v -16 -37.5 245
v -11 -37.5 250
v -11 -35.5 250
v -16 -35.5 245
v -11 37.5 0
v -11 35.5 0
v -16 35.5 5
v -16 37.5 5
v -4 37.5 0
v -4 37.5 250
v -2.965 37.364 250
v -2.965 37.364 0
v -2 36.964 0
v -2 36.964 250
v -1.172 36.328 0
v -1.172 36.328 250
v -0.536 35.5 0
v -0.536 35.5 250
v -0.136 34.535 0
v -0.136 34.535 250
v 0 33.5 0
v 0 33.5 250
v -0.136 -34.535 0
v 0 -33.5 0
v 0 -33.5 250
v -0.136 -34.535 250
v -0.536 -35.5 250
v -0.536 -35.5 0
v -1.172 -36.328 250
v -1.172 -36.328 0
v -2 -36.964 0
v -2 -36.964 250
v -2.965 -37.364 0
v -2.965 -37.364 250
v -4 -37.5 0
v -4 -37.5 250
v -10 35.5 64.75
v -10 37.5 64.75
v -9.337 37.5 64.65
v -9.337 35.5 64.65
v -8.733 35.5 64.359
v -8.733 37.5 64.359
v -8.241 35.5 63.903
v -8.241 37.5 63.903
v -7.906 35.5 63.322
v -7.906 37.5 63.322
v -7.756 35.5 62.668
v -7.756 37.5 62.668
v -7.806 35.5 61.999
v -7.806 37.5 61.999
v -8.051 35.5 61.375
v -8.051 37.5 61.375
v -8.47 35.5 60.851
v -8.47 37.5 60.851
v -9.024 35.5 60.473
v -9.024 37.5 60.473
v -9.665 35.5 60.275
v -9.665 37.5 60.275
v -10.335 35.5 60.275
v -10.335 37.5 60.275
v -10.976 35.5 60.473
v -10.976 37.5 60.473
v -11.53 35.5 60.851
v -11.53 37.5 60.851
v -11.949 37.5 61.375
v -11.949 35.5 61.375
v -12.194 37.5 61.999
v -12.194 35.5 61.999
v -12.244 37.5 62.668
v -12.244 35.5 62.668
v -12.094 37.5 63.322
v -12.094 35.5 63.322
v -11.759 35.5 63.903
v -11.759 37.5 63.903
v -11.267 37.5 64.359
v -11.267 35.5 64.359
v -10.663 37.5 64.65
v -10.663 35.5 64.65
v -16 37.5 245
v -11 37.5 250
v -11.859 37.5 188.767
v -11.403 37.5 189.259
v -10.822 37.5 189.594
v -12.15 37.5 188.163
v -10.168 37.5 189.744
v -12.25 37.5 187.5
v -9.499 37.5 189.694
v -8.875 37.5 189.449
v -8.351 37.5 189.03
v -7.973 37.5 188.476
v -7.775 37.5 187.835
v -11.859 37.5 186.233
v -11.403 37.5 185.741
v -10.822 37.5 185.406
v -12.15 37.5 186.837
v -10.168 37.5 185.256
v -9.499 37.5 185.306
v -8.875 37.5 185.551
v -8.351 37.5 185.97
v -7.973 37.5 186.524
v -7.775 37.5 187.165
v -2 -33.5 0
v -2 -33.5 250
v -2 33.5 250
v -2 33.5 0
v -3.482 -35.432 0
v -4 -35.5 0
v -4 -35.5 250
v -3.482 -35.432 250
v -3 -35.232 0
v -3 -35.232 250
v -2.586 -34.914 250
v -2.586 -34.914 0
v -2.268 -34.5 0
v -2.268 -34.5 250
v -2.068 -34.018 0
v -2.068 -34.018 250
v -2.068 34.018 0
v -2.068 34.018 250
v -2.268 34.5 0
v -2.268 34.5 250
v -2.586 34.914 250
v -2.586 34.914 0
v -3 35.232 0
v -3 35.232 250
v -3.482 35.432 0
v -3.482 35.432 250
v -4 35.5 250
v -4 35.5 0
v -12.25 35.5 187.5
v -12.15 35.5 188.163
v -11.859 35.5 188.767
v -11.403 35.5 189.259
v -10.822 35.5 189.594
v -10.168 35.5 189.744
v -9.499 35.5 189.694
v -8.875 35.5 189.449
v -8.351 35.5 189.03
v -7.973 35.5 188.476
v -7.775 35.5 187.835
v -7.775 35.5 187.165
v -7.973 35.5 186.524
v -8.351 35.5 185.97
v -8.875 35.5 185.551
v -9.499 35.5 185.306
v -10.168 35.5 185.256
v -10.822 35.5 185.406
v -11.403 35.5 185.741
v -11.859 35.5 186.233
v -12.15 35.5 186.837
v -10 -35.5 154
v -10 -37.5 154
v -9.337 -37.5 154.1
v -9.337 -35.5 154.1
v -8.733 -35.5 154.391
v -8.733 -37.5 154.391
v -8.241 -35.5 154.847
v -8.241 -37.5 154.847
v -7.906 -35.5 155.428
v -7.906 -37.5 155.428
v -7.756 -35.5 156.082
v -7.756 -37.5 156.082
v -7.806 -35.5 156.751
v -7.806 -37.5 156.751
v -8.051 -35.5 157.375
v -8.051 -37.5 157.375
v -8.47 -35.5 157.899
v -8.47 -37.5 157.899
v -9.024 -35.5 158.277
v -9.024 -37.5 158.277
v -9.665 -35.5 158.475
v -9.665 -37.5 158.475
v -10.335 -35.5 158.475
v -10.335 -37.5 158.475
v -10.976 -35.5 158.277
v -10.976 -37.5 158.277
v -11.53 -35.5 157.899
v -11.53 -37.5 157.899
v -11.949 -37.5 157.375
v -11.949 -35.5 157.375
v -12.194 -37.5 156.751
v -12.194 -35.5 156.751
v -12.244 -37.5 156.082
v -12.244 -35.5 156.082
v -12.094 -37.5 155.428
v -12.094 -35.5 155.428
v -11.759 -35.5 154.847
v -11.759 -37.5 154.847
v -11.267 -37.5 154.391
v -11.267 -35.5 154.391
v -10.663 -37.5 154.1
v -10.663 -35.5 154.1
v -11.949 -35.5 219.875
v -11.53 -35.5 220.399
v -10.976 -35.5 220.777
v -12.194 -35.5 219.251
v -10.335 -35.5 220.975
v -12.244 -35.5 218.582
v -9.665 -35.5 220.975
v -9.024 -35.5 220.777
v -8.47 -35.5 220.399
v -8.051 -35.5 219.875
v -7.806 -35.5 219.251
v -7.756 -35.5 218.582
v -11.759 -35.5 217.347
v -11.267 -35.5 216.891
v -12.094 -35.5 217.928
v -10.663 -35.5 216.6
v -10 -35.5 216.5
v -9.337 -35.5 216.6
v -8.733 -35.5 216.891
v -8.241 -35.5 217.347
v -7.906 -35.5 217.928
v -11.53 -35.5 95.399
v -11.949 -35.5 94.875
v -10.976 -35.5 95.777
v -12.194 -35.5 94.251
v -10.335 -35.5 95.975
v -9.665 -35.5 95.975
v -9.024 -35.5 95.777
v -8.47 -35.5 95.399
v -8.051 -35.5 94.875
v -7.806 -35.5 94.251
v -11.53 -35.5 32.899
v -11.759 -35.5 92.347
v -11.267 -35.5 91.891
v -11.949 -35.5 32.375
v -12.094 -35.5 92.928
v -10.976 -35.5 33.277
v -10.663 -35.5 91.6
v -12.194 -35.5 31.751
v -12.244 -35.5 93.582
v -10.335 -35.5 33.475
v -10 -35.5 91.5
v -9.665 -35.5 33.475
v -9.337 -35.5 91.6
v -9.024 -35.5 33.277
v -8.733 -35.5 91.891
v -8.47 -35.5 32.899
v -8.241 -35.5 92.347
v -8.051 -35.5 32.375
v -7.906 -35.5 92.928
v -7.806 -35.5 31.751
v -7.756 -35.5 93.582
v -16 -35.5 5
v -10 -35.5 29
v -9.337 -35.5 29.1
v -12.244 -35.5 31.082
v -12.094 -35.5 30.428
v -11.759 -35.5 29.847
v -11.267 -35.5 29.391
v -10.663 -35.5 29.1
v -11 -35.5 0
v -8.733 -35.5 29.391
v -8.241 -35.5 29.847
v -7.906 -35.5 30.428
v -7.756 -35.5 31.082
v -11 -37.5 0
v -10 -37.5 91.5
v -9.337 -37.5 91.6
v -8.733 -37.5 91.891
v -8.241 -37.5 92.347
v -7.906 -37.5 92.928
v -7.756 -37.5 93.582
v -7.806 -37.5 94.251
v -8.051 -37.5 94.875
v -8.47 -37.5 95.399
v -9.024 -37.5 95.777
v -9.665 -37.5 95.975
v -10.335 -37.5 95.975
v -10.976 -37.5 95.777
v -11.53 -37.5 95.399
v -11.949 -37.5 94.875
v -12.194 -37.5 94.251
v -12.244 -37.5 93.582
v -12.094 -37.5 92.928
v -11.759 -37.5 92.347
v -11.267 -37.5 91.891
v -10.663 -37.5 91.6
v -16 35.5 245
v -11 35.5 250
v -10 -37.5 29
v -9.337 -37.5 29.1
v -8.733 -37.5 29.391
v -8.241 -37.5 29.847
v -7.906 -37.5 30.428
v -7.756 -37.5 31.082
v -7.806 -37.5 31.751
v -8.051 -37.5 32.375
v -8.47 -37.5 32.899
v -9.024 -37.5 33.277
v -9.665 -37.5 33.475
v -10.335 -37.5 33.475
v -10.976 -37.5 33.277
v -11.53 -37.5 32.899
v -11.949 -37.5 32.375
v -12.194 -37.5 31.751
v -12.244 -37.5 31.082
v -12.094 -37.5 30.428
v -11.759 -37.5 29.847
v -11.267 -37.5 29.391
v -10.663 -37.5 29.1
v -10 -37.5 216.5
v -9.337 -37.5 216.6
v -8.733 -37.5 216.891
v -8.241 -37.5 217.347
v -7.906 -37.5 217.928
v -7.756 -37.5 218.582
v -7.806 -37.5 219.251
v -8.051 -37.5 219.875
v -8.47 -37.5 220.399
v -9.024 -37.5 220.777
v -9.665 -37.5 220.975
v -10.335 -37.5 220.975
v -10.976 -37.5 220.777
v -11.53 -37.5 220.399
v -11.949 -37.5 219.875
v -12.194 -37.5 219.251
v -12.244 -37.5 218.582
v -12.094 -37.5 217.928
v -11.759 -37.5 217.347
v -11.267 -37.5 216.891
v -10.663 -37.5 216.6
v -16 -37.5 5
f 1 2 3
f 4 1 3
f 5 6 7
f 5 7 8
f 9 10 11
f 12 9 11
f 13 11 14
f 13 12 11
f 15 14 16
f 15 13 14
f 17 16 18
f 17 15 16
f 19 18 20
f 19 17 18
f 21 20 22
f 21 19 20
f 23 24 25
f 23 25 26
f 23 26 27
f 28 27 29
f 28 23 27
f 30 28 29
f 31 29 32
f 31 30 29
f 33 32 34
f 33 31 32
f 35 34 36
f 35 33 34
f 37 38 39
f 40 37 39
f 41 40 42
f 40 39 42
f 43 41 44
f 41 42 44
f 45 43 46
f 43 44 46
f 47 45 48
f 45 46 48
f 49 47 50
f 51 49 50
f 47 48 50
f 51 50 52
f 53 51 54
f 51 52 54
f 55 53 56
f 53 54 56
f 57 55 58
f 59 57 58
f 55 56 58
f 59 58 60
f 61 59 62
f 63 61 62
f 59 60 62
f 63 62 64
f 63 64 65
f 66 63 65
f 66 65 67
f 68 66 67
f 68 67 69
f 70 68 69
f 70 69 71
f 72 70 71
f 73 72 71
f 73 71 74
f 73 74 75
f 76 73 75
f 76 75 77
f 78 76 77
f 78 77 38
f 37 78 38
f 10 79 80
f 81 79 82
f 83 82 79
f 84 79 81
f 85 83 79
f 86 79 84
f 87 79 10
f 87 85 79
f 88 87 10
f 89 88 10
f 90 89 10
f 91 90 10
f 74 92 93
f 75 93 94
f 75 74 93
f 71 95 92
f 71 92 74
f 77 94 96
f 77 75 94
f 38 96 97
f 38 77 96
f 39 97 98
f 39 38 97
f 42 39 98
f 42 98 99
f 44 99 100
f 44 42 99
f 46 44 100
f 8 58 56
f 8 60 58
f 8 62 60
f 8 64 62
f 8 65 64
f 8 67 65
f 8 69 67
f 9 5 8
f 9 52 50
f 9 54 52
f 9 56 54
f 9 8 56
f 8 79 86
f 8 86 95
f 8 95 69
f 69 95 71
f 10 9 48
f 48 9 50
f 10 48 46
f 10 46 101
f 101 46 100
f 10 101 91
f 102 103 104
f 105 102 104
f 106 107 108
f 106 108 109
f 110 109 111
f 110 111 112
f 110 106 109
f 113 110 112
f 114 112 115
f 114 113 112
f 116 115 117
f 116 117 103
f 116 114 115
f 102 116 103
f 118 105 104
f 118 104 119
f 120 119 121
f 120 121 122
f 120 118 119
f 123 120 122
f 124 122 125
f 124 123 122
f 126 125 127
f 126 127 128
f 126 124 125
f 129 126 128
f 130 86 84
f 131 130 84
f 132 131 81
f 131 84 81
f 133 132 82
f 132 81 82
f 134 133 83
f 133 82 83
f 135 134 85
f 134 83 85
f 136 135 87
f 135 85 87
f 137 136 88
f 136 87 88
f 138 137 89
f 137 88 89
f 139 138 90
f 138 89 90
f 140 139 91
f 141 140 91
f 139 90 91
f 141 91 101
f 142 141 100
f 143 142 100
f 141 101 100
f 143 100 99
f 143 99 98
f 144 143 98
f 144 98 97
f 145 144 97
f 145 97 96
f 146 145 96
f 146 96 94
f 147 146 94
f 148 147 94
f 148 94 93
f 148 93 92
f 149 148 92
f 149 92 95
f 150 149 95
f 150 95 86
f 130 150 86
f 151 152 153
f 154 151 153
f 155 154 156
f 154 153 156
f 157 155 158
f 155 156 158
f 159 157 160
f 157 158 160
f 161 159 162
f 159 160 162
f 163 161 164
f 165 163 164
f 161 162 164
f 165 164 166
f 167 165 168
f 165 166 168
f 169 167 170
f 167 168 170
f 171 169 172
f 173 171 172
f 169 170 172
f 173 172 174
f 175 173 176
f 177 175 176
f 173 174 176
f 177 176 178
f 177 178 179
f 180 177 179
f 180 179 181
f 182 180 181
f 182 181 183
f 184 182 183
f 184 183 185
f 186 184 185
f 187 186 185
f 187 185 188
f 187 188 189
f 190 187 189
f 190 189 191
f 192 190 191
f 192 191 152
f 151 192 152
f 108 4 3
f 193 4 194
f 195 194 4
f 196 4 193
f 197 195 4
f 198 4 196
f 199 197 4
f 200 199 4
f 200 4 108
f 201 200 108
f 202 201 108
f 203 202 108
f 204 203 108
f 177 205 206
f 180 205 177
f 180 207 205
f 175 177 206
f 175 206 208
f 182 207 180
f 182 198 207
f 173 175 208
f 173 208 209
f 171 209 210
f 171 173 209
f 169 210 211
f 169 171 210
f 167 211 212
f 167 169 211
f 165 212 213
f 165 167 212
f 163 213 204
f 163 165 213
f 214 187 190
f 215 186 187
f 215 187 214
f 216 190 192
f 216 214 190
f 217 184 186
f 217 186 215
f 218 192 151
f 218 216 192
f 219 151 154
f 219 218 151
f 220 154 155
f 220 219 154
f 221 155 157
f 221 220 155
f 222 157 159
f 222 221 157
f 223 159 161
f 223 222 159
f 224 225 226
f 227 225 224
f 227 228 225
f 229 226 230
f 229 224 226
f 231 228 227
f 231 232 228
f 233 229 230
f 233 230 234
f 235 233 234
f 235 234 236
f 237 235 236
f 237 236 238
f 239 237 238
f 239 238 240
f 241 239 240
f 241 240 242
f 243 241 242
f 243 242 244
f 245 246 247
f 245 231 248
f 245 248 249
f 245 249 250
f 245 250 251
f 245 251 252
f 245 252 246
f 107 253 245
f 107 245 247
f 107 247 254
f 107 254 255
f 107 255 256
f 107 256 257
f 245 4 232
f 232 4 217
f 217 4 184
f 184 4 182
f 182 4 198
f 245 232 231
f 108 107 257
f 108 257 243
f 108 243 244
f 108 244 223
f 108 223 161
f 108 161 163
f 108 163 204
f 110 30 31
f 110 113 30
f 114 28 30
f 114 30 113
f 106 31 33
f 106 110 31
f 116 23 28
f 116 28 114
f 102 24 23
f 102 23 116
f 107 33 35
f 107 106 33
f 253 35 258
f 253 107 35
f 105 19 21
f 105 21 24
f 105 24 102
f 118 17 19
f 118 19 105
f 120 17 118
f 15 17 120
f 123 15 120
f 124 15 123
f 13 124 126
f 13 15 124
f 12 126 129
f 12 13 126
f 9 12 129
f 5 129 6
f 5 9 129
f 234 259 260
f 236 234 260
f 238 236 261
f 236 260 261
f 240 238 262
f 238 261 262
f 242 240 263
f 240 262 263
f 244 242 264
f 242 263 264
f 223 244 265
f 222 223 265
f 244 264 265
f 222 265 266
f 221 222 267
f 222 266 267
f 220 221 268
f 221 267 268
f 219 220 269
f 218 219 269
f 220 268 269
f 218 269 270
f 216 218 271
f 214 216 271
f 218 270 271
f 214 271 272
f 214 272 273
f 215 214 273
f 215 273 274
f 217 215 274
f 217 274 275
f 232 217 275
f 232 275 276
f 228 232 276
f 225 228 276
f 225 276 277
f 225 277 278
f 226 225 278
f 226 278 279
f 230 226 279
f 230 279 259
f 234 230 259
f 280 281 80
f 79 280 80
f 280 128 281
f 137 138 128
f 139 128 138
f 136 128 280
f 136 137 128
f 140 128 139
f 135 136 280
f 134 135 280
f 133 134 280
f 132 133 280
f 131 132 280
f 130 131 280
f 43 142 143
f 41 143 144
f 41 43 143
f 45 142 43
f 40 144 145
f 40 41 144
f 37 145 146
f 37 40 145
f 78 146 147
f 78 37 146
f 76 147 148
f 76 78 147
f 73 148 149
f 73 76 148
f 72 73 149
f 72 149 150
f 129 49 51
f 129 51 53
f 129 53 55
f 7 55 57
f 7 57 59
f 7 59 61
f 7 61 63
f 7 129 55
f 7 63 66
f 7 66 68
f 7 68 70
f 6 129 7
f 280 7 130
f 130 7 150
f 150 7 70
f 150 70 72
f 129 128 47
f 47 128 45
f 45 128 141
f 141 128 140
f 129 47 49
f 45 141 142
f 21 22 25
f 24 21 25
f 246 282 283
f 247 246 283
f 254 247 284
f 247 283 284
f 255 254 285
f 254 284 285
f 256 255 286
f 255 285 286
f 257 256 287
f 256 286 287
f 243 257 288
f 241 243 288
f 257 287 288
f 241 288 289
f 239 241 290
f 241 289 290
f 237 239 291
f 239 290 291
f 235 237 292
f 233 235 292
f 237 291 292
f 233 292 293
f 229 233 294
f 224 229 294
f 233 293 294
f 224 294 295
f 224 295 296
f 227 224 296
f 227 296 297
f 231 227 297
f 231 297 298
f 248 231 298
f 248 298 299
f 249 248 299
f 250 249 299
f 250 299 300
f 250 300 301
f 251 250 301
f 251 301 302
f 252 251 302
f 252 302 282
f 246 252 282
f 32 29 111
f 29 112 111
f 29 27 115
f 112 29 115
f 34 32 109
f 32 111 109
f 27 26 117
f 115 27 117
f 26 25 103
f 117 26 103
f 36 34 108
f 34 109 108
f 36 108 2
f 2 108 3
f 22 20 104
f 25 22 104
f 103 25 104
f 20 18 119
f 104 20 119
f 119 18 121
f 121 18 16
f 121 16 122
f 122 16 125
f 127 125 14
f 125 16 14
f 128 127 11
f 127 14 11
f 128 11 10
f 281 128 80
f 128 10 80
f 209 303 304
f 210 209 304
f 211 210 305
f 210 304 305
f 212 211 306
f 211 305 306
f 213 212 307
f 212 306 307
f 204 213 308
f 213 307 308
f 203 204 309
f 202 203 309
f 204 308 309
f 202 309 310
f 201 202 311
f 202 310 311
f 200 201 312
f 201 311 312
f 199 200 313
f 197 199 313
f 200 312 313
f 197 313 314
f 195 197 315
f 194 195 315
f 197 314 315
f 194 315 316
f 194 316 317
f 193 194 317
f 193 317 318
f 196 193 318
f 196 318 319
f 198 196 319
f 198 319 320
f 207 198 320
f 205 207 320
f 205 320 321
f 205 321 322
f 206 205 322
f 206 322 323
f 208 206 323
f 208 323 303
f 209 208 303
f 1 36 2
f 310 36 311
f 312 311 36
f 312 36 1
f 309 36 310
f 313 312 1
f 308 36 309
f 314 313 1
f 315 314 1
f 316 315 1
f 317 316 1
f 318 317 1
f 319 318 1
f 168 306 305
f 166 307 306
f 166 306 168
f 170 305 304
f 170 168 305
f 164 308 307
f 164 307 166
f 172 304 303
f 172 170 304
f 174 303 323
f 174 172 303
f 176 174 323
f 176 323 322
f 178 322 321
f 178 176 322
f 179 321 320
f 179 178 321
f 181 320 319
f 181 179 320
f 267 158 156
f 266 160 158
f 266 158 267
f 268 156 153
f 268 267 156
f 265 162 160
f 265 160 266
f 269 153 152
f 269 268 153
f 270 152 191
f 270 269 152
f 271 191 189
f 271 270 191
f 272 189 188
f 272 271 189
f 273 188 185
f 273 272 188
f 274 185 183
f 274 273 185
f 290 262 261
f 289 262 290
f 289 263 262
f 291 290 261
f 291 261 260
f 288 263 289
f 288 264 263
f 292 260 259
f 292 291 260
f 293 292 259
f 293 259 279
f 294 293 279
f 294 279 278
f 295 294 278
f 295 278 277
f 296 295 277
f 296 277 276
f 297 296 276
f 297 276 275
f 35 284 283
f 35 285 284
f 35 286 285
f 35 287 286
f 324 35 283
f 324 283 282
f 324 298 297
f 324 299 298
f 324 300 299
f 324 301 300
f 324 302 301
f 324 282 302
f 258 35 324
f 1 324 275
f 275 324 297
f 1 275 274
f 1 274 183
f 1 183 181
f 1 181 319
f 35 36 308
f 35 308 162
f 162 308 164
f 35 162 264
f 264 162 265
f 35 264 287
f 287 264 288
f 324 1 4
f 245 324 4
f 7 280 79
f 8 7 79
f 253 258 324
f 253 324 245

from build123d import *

# Parameters (mm, degrees)
BASE_FLANGE1_DEPTH = 250
CHAMFER1_SIZE      = 5
CUT_EXTRUDE1_REACH = 263.498
SKETCH3_R          = 2.25
CUT_EXTRUDE2_REACH = 263.498
SKETCH4_R          = 2.25


# Sheet-metal steps are written as plain solids
with BuildPart() as part:
    # Sketch1 → Base-Flange1 (new body)
    with BuildSketch(Plane.XY):
        with BuildLine():
            Line((-16, 37.5), (-4, 37.5))
            ThreePointArc((-4, 37.5), (-1.171572875, 36.328427125), (0, 33.5))
            Line((0, 33.5), (0, -33.5))
            ThreePointArc((0, -33.5), (-1.171572875, -36.328427125), (-4, -37.5))
            Line((-4, -37.5), (-16, -37.5))
            Line((-16, -37.5), (-16, -35.5))
            Line((-16, -35.5), (-4, -35.5))
            ThreePointArc((-4, -35.5), (-2.585786438, -34.914213562), (-2, -33.5))
            Line((-2, -33.5), (-2, 33.5))
            ThreePointArc((-2, 33.5), (-2.585786438, 34.914213562), (-4, 35.5))
            Line((-4, 35.5), (-16, 35.5))
            Line((-16, 35.5), (-16, 37.5))
        make_face()
    extrude(amount=BASE_FLANGE1_DEPTH)

    # Chamfer1
    chamfer1_edges = [part.edges().sort_by_distance(p)[0] for p in [
        (-16, 36.5, 0),
        (-16, -36.5, 0),
        (-16, 36.5, 250),
        (-16, -36.5, 250),
    ]]
    chamfer(chamfer1_edges, length=CHAMFER1_SIZE)

    # Sketch3 → Cut-Extrude1 (cut, up to next)
    with BuildSketch(Plane(origin=(0, 37.5, 0), x_dir=(1, 0, 0), z_dir=(0, 1, 0)), mode=Mode.PRIVATE) as cut_extrude1_sk1:
        with Locations(Location((-10, -62.5, 0), (0, 0, 270))):
            Circle(SKETCH3_R)
    cut_extrude1_tool1 = extrude(cut_extrude1_sk1.sketch, amount=-CUT_EXTRUDE1_REACH, mode=Mode.PRIVATE) & part.part
    # Sketch3 → Cut-Extrude1 (cut, up to next)
    with BuildSketch(Plane(origin=(0, 37.5, 0), x_dir=(1, 0, 0), z_dir=(0, 1, 0)), mode=Mode.PRIVATE) as cut_extrude1_sk2:
        with Locations(Location((-10, -187.5, 0), (0, 0, 180))):
            Circle(SKETCH3_R)
    cut_extrude1_tool2 = extrude(cut_extrude1_sk2.sketch, amount=-CUT_EXTRUDE1_REACH, mode=Mode.PRIVATE) & part.part
    add(cut_extrude1_tool1.solids().sort_by_distance((-10, 37.5, 62.5))[0], mode=Mode.SUBTRACT)
    add(cut_extrude1_tool2.solids().sort_by_distance((-10, 37.5, 187.5))[0], mode=Mode.SUBTRACT)

    # Sketch4 → Cut-Extrude2 (cut, up to next)
    with BuildSketch(Plane.XZ.offset(37.5), mode=Mode.PRIVATE) as cut_extrude2_sk1:
        with Locations(Location((-10, 31.25, 0), (0, 0, 270))):
            Circle(SKETCH4_R)
    cut_extrude2_tool1 = extrude(cut_extrude2_sk1.sketch, amount=-CUT_EXTRUDE2_REACH, mode=Mode.PRIVATE) & part.part
    # Sketch4 → Cut-Extrude2 (cut, up to next)
    with BuildSketch(Plane.XZ.offset(37.5), mode=Mode.PRIVATE) as cut_extrude2_sk2:
        with Locations(Location((-10, 93.75, 0), (0, 0, 270))):
            Circle(SKETCH4_R)
    cut_extrude2_tool2 = extrude(cut_extrude2_sk2.sketch, amount=-CUT_EXTRUDE2_REACH, mode=Mode.PRIVATE) & part.part
    # Sketch4 → Cut-Extrude2 (cut, up to next)
    with BuildSketch(Plane.XZ.offset(37.5), mode=Mode.PRIVATE) as cut_extrude2_sk3:
        with Locations(Location((-10, 156.25, 0), (0, 0, 270))):
            Circle(SKETCH4_R)
    cut_extrude2_tool3 = extrude(cut_extrude2_sk3.sketch, amount=-CUT_EXTRUDE2_REACH, mode=Mode.PRIVATE) & part.part
    # Sketch4 → Cut-Extrude2 (cut, up to next)
    with BuildSketch(Plane.XZ.offset(37.5), mode=Mode.PRIVATE) as cut_extrude2_sk4:
        with Locations(Location((-10, 218.75, 0), (0, 0, 270))):
            Circle(SKETCH4_R)
    cut_extrude2_tool4 = extrude(cut_extrude2_sk4.sketch, amount=-CUT_EXTRUDE2_REACH, mode=Mode.PRIVATE) & part.part
    add(cut_extrude2_tool1.solids().sort_by_distance((-10, -37.5, 31.25))[0], mode=Mode.SUBTRACT)
    add(cut_extrude2_tool2.solids().sort_by_distance((-10, -37.5, 93.75))[0], mode=Mode.SUBTRACT)
    add(cut_extrude2_tool3.solids().sort_by_distance((-10, -37.5, 156.25))[0], mode=Mode.SUBTRACT)
    add(cut_extrude2_tool4.solids().sort_by_distance((-10, -37.5, 218.75))[0], mode=Mode.SUBTRACT)


solid = part.part
